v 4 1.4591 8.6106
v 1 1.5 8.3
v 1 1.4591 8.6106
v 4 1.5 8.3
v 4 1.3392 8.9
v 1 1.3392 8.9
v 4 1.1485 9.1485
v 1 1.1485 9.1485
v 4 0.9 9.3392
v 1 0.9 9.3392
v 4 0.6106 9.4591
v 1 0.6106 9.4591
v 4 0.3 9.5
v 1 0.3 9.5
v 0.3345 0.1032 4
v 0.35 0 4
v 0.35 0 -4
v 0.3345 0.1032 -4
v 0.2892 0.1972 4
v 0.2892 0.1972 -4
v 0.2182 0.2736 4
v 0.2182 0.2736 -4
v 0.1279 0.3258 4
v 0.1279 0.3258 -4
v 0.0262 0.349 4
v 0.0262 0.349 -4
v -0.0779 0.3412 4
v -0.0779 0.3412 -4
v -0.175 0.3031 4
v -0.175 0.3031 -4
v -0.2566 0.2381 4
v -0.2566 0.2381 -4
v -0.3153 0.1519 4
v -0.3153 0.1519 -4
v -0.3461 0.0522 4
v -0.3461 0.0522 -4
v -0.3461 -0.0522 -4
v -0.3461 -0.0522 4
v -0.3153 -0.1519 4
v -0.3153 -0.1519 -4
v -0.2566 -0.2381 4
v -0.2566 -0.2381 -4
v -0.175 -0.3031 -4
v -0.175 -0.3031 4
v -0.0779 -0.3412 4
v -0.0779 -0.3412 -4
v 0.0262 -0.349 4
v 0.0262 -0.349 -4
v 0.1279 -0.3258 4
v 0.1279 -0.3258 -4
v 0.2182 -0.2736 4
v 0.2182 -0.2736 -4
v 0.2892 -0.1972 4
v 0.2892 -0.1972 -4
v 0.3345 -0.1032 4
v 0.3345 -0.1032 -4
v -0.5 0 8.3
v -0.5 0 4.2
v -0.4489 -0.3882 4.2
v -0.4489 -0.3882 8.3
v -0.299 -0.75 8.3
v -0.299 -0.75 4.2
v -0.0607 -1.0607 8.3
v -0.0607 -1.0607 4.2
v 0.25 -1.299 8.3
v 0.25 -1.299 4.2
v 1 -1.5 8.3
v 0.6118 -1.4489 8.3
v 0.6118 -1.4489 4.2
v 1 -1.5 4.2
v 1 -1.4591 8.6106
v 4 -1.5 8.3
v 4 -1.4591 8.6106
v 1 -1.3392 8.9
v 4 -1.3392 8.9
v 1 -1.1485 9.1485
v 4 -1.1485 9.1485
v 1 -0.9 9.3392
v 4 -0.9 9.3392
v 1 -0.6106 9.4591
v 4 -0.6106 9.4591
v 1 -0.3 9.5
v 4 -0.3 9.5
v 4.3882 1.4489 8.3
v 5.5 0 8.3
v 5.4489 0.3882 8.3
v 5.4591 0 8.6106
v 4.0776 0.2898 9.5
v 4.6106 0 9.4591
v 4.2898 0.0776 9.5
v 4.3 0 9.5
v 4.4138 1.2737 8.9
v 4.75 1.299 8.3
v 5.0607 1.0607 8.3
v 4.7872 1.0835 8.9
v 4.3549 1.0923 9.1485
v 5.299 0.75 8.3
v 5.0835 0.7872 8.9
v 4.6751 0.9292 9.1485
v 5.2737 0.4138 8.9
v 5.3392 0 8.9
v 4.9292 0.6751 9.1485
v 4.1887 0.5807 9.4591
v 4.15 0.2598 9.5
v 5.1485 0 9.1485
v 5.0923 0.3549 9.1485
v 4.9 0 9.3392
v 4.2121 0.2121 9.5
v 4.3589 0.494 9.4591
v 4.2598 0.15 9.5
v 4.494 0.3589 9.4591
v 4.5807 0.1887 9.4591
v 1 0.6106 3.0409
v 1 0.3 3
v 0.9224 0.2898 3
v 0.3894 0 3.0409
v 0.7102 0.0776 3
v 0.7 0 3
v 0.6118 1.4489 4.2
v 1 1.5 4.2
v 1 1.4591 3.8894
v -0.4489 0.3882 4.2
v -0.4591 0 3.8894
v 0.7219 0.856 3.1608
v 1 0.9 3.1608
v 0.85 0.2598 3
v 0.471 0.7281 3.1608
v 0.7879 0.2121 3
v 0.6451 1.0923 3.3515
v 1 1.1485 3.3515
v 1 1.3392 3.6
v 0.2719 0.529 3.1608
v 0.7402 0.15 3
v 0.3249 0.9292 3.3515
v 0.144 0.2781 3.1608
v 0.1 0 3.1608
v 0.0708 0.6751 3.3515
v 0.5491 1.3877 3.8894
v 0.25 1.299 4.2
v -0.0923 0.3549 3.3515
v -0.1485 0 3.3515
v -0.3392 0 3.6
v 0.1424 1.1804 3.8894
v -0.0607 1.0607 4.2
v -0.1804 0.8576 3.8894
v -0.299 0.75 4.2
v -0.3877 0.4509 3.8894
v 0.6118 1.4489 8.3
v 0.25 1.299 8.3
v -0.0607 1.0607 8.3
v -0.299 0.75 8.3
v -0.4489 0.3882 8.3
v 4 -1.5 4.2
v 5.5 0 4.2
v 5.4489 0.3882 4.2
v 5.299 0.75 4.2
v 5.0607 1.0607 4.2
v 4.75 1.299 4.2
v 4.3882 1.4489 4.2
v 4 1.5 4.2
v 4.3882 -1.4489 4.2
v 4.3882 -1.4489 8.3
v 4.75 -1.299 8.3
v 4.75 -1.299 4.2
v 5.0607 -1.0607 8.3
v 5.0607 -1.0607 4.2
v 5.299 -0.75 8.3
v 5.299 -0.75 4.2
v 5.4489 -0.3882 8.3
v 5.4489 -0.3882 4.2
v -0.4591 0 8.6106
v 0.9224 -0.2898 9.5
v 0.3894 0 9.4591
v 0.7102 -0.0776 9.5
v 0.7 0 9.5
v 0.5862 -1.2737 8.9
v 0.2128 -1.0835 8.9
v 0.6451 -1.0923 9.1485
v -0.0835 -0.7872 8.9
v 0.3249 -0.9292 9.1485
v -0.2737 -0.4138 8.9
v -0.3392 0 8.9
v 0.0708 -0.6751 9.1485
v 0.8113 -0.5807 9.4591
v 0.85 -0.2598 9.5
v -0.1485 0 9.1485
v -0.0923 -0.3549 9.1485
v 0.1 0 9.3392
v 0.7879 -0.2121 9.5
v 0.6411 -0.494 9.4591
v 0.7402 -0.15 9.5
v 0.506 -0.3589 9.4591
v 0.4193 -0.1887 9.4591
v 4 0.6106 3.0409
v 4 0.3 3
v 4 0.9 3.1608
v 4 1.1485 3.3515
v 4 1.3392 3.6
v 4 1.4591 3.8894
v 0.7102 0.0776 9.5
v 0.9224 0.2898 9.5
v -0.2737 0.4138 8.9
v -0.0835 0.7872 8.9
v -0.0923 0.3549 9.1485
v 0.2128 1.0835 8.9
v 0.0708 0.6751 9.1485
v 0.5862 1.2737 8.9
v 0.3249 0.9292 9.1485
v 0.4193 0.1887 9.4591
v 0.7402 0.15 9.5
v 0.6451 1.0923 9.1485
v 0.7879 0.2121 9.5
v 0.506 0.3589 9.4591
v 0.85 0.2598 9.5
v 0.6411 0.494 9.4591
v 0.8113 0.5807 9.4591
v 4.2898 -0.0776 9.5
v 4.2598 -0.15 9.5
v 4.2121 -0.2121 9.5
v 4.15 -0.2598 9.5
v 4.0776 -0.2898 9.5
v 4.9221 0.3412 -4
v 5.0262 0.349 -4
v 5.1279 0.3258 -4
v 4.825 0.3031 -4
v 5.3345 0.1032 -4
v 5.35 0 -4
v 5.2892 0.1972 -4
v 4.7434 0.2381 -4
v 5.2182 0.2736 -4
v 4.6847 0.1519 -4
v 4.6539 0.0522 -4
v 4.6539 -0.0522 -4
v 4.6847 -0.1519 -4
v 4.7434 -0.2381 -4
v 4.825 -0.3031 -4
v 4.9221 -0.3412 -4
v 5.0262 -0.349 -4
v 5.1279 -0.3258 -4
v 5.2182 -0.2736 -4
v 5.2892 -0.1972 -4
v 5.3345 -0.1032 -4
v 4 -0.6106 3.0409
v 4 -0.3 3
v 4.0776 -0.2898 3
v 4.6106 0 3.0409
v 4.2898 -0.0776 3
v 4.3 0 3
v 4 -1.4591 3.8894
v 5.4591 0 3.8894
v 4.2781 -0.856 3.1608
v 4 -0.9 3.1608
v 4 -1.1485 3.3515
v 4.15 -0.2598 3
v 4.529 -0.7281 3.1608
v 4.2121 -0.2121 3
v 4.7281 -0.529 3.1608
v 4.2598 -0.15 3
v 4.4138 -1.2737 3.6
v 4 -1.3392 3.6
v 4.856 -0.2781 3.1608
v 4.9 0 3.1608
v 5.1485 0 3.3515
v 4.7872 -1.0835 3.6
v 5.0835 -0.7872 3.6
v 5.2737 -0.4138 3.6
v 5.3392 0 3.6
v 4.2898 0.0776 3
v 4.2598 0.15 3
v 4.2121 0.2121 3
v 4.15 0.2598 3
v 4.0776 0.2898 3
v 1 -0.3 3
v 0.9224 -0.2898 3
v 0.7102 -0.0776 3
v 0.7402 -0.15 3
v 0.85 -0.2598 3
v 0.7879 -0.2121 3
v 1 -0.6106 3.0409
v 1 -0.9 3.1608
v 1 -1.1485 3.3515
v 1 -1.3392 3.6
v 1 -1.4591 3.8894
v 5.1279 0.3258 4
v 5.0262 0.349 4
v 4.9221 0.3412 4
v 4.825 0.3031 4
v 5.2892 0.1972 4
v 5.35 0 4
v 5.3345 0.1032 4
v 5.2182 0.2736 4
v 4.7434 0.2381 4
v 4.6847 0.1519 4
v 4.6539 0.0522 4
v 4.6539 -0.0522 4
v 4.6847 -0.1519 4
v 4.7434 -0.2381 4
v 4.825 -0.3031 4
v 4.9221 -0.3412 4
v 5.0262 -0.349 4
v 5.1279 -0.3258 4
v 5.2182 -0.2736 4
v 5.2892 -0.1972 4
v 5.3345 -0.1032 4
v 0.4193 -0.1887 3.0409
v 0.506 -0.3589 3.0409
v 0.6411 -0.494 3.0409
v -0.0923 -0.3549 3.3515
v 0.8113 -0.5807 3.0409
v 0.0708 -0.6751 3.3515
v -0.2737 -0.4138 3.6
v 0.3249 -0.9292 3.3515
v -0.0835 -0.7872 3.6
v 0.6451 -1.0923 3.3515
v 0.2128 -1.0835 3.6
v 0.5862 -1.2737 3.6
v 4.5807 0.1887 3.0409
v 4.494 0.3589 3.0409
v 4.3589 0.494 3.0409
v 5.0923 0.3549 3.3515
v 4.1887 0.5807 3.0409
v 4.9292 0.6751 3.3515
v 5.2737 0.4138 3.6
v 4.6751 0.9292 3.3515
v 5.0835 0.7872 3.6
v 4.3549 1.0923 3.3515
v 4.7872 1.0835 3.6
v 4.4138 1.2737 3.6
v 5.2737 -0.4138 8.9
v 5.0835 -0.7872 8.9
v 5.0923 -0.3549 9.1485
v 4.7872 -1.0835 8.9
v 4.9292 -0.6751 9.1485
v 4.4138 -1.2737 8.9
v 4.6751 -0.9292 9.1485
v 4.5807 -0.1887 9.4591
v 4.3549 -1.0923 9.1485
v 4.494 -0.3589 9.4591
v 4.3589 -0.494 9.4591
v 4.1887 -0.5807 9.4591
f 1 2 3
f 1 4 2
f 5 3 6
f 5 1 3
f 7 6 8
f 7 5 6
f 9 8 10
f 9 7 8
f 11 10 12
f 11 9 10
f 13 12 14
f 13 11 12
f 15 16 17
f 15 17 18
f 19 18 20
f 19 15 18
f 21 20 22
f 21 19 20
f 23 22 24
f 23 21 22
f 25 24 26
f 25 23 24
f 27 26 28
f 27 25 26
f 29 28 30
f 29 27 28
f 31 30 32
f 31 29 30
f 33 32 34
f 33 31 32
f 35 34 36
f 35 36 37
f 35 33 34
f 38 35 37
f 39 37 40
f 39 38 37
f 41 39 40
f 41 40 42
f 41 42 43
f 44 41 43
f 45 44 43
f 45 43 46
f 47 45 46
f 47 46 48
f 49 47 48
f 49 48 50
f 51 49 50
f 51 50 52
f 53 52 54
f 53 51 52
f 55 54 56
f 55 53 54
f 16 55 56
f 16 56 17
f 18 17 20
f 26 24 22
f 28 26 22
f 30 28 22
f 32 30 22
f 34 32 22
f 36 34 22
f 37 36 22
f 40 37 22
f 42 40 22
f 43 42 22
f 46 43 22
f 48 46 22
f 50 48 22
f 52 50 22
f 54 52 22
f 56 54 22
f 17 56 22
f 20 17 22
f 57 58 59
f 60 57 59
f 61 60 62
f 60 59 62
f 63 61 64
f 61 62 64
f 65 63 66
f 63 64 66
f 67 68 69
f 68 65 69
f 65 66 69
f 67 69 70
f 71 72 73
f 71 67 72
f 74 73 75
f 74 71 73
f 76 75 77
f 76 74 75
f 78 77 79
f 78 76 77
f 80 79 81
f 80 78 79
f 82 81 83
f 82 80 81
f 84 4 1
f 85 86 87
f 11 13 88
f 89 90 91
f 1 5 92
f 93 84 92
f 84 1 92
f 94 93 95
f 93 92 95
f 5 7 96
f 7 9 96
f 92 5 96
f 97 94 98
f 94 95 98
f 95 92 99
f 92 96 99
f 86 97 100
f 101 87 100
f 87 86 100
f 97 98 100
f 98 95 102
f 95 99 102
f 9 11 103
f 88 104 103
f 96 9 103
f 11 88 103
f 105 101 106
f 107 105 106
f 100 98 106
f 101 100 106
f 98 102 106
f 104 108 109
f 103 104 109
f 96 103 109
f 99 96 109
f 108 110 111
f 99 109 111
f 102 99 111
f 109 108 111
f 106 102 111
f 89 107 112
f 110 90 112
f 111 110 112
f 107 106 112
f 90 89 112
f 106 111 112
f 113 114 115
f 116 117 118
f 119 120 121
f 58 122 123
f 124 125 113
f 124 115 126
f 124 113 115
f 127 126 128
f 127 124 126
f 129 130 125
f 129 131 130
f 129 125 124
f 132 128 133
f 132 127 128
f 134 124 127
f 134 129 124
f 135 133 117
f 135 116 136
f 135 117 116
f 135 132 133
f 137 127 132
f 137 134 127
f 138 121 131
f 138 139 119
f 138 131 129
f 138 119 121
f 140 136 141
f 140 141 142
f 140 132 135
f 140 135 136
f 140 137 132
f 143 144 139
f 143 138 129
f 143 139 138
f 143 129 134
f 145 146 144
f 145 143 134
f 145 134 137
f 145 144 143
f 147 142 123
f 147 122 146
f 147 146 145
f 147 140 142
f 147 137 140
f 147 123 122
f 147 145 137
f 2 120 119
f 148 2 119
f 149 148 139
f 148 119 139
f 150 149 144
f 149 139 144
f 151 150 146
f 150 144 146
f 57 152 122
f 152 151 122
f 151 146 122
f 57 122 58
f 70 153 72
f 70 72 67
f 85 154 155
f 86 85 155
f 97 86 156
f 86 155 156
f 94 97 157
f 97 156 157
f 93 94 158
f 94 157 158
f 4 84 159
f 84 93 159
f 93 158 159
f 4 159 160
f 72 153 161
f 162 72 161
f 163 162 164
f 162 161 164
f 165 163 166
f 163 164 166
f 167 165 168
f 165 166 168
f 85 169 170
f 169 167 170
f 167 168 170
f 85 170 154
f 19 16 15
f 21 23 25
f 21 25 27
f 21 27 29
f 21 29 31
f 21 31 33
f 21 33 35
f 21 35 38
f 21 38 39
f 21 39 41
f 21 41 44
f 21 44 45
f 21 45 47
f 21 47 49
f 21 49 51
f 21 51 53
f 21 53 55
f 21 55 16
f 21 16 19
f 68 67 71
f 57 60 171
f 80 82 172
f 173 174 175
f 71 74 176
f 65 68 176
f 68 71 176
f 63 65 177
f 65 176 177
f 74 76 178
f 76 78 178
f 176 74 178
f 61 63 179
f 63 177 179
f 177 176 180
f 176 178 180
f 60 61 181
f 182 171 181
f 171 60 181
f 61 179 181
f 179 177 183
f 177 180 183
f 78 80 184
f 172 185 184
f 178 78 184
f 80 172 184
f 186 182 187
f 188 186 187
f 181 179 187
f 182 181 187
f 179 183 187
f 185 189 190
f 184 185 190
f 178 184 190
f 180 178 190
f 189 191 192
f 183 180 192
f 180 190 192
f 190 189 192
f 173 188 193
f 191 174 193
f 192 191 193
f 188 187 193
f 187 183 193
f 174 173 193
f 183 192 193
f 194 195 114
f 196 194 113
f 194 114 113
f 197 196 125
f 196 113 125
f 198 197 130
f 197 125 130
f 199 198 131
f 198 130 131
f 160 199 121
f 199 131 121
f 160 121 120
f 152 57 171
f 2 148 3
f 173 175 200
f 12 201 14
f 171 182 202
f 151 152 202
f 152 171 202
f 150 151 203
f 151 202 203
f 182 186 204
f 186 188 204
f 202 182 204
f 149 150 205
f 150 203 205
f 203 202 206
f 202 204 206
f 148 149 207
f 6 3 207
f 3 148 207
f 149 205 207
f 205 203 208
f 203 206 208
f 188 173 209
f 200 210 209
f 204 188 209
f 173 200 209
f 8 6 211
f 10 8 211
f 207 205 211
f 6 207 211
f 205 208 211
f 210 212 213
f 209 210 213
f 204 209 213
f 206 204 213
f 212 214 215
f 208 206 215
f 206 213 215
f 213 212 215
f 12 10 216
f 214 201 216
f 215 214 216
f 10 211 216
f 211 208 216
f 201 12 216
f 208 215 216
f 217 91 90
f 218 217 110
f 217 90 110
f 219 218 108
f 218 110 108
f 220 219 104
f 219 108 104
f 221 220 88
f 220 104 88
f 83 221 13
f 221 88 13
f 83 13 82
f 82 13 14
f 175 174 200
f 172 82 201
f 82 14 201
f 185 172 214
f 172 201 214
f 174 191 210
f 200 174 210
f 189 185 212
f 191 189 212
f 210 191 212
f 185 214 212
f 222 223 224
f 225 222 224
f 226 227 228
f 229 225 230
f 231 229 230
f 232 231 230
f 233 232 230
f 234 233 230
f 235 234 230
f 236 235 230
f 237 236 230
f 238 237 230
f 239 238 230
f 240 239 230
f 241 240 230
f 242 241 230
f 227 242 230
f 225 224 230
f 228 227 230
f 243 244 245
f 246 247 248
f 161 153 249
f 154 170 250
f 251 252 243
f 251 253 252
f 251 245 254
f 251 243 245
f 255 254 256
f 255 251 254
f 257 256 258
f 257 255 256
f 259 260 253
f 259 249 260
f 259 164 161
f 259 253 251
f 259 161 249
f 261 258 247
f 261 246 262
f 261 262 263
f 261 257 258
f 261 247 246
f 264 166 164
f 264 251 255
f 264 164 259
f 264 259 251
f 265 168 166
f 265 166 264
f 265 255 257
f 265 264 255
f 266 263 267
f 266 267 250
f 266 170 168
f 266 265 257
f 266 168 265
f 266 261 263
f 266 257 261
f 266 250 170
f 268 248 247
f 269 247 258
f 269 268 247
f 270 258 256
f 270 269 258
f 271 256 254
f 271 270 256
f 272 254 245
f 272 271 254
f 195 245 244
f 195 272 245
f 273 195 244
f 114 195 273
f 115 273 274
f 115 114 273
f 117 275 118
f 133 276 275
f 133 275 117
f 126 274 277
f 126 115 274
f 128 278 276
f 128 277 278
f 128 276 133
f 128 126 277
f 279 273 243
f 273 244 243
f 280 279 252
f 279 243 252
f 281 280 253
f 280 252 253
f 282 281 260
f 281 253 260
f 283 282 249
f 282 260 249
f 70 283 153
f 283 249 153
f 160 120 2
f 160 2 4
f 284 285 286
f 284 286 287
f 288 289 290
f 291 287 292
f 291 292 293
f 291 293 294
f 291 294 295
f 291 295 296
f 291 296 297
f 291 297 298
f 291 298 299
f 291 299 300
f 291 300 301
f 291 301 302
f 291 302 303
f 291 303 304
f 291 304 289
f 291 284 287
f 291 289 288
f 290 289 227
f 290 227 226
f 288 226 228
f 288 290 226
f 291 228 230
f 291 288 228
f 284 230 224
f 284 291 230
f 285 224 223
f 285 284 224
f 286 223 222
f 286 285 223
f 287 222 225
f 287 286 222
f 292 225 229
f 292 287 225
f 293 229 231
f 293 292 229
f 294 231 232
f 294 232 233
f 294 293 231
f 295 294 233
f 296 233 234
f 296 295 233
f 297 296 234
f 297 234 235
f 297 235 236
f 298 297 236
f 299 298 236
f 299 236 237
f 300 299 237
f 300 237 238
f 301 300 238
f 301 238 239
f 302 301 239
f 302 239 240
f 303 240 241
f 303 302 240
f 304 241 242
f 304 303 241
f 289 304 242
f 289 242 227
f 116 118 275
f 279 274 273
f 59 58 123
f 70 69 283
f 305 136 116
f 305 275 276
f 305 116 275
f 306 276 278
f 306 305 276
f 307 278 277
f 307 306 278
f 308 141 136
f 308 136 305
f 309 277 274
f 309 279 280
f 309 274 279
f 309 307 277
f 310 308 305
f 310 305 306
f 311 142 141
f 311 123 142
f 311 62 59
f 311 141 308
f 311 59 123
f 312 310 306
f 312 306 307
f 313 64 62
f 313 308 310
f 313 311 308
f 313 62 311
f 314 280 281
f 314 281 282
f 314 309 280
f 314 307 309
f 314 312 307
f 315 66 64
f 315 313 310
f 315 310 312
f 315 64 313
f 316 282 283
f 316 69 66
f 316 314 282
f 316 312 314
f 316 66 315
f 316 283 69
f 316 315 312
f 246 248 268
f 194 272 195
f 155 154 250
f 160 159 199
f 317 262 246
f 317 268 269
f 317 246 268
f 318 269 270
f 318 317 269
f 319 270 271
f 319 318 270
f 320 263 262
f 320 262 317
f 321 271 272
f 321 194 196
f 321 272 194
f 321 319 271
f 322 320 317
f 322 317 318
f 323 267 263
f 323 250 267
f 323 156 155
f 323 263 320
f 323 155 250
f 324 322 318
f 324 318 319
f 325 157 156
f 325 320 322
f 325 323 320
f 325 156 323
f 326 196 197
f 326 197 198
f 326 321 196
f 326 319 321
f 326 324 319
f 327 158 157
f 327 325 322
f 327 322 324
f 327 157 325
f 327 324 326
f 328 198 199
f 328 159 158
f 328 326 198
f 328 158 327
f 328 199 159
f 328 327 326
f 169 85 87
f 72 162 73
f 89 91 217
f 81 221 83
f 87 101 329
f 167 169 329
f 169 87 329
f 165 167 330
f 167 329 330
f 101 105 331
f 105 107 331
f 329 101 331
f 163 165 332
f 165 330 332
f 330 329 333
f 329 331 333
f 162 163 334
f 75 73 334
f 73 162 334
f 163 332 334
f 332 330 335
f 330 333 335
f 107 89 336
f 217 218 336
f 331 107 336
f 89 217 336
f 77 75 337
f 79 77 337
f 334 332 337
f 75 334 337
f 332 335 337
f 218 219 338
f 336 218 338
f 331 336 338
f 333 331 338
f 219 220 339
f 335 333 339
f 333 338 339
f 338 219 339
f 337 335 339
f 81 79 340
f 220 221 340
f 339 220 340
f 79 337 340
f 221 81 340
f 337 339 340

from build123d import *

# Parameters (mm, degrees)
SKETCH_R     = 0.35
PAD_DEPTH    = 8
PAD002_DEPTH = 6.5
FILLET_R     = 1.2
FILLET001_R  = 1.2


with BuildPart() as pad:
    # Sketch → Pad (new body)
    with BuildSketch(Plane.XY.offset(4)):
        Circle(SKETCH_R)
        with Locations((5, 0)):
            Circle(SKETCH_R)
    extrude(amount=-PAD_DEPTH)


with BuildPart() as fillet001:
    # Sketch003 → Pad002 (new body)
    with BuildSketch(Plane.XY.offset(3)):
        with BuildLine():
            Line((1, 1.5), (4, 1.5))
            ThreePointArc((5.5, 0), (5.06066, 1.06066), (4, 1.5))
            ThreePointArc((4, -1.5), (5.06066, -1.06066), (5.5, 0))
            Line((4, -1.5), (1, -1.5))
            ThreePointArc((-0.5, 0), (-0.06066, -1.06066), (1, -1.5))
            ThreePointArc((1, 1.5), (-0.06066, 1.06066), (-0.5, 0))
        make_face()
    extrude(amount=PAD002_DEPTH)

    # Fillet
    fillet_edges = [fillet001.edges().sort_by_distance(p)[0] for p in [
        (2.5, 1.5, 9.5),
        (-0.06066, 1.06066, 9.5),
        (-0.06066, -1.06066, 9.5),
        (2.5, -1.5, 9.5),
        (5.06066, -1.06066, 9.5),
        (5.06066, 1.06066, 9.5),
    ]]
    fillet(fillet_edges, radius=FILLET_R)

    # Fillet001
    fillet001_edges = [fillet001.edges().sort_by_distance(p)[0] for p in [
        (5.06066, -1.06066, 3),
        (5.06066, 1.06066, 3),
        (2.5, 1.5, 3),
        (2.5, -1.5, 3),
        (-0.06066, -1.06066, 3),
        (-0.06066, 1.06066, 3),
    ]]
    fillet(fillet001_edges, radius=FILLET001_R)


solid = Compound([pad.part, fillet001.part])
